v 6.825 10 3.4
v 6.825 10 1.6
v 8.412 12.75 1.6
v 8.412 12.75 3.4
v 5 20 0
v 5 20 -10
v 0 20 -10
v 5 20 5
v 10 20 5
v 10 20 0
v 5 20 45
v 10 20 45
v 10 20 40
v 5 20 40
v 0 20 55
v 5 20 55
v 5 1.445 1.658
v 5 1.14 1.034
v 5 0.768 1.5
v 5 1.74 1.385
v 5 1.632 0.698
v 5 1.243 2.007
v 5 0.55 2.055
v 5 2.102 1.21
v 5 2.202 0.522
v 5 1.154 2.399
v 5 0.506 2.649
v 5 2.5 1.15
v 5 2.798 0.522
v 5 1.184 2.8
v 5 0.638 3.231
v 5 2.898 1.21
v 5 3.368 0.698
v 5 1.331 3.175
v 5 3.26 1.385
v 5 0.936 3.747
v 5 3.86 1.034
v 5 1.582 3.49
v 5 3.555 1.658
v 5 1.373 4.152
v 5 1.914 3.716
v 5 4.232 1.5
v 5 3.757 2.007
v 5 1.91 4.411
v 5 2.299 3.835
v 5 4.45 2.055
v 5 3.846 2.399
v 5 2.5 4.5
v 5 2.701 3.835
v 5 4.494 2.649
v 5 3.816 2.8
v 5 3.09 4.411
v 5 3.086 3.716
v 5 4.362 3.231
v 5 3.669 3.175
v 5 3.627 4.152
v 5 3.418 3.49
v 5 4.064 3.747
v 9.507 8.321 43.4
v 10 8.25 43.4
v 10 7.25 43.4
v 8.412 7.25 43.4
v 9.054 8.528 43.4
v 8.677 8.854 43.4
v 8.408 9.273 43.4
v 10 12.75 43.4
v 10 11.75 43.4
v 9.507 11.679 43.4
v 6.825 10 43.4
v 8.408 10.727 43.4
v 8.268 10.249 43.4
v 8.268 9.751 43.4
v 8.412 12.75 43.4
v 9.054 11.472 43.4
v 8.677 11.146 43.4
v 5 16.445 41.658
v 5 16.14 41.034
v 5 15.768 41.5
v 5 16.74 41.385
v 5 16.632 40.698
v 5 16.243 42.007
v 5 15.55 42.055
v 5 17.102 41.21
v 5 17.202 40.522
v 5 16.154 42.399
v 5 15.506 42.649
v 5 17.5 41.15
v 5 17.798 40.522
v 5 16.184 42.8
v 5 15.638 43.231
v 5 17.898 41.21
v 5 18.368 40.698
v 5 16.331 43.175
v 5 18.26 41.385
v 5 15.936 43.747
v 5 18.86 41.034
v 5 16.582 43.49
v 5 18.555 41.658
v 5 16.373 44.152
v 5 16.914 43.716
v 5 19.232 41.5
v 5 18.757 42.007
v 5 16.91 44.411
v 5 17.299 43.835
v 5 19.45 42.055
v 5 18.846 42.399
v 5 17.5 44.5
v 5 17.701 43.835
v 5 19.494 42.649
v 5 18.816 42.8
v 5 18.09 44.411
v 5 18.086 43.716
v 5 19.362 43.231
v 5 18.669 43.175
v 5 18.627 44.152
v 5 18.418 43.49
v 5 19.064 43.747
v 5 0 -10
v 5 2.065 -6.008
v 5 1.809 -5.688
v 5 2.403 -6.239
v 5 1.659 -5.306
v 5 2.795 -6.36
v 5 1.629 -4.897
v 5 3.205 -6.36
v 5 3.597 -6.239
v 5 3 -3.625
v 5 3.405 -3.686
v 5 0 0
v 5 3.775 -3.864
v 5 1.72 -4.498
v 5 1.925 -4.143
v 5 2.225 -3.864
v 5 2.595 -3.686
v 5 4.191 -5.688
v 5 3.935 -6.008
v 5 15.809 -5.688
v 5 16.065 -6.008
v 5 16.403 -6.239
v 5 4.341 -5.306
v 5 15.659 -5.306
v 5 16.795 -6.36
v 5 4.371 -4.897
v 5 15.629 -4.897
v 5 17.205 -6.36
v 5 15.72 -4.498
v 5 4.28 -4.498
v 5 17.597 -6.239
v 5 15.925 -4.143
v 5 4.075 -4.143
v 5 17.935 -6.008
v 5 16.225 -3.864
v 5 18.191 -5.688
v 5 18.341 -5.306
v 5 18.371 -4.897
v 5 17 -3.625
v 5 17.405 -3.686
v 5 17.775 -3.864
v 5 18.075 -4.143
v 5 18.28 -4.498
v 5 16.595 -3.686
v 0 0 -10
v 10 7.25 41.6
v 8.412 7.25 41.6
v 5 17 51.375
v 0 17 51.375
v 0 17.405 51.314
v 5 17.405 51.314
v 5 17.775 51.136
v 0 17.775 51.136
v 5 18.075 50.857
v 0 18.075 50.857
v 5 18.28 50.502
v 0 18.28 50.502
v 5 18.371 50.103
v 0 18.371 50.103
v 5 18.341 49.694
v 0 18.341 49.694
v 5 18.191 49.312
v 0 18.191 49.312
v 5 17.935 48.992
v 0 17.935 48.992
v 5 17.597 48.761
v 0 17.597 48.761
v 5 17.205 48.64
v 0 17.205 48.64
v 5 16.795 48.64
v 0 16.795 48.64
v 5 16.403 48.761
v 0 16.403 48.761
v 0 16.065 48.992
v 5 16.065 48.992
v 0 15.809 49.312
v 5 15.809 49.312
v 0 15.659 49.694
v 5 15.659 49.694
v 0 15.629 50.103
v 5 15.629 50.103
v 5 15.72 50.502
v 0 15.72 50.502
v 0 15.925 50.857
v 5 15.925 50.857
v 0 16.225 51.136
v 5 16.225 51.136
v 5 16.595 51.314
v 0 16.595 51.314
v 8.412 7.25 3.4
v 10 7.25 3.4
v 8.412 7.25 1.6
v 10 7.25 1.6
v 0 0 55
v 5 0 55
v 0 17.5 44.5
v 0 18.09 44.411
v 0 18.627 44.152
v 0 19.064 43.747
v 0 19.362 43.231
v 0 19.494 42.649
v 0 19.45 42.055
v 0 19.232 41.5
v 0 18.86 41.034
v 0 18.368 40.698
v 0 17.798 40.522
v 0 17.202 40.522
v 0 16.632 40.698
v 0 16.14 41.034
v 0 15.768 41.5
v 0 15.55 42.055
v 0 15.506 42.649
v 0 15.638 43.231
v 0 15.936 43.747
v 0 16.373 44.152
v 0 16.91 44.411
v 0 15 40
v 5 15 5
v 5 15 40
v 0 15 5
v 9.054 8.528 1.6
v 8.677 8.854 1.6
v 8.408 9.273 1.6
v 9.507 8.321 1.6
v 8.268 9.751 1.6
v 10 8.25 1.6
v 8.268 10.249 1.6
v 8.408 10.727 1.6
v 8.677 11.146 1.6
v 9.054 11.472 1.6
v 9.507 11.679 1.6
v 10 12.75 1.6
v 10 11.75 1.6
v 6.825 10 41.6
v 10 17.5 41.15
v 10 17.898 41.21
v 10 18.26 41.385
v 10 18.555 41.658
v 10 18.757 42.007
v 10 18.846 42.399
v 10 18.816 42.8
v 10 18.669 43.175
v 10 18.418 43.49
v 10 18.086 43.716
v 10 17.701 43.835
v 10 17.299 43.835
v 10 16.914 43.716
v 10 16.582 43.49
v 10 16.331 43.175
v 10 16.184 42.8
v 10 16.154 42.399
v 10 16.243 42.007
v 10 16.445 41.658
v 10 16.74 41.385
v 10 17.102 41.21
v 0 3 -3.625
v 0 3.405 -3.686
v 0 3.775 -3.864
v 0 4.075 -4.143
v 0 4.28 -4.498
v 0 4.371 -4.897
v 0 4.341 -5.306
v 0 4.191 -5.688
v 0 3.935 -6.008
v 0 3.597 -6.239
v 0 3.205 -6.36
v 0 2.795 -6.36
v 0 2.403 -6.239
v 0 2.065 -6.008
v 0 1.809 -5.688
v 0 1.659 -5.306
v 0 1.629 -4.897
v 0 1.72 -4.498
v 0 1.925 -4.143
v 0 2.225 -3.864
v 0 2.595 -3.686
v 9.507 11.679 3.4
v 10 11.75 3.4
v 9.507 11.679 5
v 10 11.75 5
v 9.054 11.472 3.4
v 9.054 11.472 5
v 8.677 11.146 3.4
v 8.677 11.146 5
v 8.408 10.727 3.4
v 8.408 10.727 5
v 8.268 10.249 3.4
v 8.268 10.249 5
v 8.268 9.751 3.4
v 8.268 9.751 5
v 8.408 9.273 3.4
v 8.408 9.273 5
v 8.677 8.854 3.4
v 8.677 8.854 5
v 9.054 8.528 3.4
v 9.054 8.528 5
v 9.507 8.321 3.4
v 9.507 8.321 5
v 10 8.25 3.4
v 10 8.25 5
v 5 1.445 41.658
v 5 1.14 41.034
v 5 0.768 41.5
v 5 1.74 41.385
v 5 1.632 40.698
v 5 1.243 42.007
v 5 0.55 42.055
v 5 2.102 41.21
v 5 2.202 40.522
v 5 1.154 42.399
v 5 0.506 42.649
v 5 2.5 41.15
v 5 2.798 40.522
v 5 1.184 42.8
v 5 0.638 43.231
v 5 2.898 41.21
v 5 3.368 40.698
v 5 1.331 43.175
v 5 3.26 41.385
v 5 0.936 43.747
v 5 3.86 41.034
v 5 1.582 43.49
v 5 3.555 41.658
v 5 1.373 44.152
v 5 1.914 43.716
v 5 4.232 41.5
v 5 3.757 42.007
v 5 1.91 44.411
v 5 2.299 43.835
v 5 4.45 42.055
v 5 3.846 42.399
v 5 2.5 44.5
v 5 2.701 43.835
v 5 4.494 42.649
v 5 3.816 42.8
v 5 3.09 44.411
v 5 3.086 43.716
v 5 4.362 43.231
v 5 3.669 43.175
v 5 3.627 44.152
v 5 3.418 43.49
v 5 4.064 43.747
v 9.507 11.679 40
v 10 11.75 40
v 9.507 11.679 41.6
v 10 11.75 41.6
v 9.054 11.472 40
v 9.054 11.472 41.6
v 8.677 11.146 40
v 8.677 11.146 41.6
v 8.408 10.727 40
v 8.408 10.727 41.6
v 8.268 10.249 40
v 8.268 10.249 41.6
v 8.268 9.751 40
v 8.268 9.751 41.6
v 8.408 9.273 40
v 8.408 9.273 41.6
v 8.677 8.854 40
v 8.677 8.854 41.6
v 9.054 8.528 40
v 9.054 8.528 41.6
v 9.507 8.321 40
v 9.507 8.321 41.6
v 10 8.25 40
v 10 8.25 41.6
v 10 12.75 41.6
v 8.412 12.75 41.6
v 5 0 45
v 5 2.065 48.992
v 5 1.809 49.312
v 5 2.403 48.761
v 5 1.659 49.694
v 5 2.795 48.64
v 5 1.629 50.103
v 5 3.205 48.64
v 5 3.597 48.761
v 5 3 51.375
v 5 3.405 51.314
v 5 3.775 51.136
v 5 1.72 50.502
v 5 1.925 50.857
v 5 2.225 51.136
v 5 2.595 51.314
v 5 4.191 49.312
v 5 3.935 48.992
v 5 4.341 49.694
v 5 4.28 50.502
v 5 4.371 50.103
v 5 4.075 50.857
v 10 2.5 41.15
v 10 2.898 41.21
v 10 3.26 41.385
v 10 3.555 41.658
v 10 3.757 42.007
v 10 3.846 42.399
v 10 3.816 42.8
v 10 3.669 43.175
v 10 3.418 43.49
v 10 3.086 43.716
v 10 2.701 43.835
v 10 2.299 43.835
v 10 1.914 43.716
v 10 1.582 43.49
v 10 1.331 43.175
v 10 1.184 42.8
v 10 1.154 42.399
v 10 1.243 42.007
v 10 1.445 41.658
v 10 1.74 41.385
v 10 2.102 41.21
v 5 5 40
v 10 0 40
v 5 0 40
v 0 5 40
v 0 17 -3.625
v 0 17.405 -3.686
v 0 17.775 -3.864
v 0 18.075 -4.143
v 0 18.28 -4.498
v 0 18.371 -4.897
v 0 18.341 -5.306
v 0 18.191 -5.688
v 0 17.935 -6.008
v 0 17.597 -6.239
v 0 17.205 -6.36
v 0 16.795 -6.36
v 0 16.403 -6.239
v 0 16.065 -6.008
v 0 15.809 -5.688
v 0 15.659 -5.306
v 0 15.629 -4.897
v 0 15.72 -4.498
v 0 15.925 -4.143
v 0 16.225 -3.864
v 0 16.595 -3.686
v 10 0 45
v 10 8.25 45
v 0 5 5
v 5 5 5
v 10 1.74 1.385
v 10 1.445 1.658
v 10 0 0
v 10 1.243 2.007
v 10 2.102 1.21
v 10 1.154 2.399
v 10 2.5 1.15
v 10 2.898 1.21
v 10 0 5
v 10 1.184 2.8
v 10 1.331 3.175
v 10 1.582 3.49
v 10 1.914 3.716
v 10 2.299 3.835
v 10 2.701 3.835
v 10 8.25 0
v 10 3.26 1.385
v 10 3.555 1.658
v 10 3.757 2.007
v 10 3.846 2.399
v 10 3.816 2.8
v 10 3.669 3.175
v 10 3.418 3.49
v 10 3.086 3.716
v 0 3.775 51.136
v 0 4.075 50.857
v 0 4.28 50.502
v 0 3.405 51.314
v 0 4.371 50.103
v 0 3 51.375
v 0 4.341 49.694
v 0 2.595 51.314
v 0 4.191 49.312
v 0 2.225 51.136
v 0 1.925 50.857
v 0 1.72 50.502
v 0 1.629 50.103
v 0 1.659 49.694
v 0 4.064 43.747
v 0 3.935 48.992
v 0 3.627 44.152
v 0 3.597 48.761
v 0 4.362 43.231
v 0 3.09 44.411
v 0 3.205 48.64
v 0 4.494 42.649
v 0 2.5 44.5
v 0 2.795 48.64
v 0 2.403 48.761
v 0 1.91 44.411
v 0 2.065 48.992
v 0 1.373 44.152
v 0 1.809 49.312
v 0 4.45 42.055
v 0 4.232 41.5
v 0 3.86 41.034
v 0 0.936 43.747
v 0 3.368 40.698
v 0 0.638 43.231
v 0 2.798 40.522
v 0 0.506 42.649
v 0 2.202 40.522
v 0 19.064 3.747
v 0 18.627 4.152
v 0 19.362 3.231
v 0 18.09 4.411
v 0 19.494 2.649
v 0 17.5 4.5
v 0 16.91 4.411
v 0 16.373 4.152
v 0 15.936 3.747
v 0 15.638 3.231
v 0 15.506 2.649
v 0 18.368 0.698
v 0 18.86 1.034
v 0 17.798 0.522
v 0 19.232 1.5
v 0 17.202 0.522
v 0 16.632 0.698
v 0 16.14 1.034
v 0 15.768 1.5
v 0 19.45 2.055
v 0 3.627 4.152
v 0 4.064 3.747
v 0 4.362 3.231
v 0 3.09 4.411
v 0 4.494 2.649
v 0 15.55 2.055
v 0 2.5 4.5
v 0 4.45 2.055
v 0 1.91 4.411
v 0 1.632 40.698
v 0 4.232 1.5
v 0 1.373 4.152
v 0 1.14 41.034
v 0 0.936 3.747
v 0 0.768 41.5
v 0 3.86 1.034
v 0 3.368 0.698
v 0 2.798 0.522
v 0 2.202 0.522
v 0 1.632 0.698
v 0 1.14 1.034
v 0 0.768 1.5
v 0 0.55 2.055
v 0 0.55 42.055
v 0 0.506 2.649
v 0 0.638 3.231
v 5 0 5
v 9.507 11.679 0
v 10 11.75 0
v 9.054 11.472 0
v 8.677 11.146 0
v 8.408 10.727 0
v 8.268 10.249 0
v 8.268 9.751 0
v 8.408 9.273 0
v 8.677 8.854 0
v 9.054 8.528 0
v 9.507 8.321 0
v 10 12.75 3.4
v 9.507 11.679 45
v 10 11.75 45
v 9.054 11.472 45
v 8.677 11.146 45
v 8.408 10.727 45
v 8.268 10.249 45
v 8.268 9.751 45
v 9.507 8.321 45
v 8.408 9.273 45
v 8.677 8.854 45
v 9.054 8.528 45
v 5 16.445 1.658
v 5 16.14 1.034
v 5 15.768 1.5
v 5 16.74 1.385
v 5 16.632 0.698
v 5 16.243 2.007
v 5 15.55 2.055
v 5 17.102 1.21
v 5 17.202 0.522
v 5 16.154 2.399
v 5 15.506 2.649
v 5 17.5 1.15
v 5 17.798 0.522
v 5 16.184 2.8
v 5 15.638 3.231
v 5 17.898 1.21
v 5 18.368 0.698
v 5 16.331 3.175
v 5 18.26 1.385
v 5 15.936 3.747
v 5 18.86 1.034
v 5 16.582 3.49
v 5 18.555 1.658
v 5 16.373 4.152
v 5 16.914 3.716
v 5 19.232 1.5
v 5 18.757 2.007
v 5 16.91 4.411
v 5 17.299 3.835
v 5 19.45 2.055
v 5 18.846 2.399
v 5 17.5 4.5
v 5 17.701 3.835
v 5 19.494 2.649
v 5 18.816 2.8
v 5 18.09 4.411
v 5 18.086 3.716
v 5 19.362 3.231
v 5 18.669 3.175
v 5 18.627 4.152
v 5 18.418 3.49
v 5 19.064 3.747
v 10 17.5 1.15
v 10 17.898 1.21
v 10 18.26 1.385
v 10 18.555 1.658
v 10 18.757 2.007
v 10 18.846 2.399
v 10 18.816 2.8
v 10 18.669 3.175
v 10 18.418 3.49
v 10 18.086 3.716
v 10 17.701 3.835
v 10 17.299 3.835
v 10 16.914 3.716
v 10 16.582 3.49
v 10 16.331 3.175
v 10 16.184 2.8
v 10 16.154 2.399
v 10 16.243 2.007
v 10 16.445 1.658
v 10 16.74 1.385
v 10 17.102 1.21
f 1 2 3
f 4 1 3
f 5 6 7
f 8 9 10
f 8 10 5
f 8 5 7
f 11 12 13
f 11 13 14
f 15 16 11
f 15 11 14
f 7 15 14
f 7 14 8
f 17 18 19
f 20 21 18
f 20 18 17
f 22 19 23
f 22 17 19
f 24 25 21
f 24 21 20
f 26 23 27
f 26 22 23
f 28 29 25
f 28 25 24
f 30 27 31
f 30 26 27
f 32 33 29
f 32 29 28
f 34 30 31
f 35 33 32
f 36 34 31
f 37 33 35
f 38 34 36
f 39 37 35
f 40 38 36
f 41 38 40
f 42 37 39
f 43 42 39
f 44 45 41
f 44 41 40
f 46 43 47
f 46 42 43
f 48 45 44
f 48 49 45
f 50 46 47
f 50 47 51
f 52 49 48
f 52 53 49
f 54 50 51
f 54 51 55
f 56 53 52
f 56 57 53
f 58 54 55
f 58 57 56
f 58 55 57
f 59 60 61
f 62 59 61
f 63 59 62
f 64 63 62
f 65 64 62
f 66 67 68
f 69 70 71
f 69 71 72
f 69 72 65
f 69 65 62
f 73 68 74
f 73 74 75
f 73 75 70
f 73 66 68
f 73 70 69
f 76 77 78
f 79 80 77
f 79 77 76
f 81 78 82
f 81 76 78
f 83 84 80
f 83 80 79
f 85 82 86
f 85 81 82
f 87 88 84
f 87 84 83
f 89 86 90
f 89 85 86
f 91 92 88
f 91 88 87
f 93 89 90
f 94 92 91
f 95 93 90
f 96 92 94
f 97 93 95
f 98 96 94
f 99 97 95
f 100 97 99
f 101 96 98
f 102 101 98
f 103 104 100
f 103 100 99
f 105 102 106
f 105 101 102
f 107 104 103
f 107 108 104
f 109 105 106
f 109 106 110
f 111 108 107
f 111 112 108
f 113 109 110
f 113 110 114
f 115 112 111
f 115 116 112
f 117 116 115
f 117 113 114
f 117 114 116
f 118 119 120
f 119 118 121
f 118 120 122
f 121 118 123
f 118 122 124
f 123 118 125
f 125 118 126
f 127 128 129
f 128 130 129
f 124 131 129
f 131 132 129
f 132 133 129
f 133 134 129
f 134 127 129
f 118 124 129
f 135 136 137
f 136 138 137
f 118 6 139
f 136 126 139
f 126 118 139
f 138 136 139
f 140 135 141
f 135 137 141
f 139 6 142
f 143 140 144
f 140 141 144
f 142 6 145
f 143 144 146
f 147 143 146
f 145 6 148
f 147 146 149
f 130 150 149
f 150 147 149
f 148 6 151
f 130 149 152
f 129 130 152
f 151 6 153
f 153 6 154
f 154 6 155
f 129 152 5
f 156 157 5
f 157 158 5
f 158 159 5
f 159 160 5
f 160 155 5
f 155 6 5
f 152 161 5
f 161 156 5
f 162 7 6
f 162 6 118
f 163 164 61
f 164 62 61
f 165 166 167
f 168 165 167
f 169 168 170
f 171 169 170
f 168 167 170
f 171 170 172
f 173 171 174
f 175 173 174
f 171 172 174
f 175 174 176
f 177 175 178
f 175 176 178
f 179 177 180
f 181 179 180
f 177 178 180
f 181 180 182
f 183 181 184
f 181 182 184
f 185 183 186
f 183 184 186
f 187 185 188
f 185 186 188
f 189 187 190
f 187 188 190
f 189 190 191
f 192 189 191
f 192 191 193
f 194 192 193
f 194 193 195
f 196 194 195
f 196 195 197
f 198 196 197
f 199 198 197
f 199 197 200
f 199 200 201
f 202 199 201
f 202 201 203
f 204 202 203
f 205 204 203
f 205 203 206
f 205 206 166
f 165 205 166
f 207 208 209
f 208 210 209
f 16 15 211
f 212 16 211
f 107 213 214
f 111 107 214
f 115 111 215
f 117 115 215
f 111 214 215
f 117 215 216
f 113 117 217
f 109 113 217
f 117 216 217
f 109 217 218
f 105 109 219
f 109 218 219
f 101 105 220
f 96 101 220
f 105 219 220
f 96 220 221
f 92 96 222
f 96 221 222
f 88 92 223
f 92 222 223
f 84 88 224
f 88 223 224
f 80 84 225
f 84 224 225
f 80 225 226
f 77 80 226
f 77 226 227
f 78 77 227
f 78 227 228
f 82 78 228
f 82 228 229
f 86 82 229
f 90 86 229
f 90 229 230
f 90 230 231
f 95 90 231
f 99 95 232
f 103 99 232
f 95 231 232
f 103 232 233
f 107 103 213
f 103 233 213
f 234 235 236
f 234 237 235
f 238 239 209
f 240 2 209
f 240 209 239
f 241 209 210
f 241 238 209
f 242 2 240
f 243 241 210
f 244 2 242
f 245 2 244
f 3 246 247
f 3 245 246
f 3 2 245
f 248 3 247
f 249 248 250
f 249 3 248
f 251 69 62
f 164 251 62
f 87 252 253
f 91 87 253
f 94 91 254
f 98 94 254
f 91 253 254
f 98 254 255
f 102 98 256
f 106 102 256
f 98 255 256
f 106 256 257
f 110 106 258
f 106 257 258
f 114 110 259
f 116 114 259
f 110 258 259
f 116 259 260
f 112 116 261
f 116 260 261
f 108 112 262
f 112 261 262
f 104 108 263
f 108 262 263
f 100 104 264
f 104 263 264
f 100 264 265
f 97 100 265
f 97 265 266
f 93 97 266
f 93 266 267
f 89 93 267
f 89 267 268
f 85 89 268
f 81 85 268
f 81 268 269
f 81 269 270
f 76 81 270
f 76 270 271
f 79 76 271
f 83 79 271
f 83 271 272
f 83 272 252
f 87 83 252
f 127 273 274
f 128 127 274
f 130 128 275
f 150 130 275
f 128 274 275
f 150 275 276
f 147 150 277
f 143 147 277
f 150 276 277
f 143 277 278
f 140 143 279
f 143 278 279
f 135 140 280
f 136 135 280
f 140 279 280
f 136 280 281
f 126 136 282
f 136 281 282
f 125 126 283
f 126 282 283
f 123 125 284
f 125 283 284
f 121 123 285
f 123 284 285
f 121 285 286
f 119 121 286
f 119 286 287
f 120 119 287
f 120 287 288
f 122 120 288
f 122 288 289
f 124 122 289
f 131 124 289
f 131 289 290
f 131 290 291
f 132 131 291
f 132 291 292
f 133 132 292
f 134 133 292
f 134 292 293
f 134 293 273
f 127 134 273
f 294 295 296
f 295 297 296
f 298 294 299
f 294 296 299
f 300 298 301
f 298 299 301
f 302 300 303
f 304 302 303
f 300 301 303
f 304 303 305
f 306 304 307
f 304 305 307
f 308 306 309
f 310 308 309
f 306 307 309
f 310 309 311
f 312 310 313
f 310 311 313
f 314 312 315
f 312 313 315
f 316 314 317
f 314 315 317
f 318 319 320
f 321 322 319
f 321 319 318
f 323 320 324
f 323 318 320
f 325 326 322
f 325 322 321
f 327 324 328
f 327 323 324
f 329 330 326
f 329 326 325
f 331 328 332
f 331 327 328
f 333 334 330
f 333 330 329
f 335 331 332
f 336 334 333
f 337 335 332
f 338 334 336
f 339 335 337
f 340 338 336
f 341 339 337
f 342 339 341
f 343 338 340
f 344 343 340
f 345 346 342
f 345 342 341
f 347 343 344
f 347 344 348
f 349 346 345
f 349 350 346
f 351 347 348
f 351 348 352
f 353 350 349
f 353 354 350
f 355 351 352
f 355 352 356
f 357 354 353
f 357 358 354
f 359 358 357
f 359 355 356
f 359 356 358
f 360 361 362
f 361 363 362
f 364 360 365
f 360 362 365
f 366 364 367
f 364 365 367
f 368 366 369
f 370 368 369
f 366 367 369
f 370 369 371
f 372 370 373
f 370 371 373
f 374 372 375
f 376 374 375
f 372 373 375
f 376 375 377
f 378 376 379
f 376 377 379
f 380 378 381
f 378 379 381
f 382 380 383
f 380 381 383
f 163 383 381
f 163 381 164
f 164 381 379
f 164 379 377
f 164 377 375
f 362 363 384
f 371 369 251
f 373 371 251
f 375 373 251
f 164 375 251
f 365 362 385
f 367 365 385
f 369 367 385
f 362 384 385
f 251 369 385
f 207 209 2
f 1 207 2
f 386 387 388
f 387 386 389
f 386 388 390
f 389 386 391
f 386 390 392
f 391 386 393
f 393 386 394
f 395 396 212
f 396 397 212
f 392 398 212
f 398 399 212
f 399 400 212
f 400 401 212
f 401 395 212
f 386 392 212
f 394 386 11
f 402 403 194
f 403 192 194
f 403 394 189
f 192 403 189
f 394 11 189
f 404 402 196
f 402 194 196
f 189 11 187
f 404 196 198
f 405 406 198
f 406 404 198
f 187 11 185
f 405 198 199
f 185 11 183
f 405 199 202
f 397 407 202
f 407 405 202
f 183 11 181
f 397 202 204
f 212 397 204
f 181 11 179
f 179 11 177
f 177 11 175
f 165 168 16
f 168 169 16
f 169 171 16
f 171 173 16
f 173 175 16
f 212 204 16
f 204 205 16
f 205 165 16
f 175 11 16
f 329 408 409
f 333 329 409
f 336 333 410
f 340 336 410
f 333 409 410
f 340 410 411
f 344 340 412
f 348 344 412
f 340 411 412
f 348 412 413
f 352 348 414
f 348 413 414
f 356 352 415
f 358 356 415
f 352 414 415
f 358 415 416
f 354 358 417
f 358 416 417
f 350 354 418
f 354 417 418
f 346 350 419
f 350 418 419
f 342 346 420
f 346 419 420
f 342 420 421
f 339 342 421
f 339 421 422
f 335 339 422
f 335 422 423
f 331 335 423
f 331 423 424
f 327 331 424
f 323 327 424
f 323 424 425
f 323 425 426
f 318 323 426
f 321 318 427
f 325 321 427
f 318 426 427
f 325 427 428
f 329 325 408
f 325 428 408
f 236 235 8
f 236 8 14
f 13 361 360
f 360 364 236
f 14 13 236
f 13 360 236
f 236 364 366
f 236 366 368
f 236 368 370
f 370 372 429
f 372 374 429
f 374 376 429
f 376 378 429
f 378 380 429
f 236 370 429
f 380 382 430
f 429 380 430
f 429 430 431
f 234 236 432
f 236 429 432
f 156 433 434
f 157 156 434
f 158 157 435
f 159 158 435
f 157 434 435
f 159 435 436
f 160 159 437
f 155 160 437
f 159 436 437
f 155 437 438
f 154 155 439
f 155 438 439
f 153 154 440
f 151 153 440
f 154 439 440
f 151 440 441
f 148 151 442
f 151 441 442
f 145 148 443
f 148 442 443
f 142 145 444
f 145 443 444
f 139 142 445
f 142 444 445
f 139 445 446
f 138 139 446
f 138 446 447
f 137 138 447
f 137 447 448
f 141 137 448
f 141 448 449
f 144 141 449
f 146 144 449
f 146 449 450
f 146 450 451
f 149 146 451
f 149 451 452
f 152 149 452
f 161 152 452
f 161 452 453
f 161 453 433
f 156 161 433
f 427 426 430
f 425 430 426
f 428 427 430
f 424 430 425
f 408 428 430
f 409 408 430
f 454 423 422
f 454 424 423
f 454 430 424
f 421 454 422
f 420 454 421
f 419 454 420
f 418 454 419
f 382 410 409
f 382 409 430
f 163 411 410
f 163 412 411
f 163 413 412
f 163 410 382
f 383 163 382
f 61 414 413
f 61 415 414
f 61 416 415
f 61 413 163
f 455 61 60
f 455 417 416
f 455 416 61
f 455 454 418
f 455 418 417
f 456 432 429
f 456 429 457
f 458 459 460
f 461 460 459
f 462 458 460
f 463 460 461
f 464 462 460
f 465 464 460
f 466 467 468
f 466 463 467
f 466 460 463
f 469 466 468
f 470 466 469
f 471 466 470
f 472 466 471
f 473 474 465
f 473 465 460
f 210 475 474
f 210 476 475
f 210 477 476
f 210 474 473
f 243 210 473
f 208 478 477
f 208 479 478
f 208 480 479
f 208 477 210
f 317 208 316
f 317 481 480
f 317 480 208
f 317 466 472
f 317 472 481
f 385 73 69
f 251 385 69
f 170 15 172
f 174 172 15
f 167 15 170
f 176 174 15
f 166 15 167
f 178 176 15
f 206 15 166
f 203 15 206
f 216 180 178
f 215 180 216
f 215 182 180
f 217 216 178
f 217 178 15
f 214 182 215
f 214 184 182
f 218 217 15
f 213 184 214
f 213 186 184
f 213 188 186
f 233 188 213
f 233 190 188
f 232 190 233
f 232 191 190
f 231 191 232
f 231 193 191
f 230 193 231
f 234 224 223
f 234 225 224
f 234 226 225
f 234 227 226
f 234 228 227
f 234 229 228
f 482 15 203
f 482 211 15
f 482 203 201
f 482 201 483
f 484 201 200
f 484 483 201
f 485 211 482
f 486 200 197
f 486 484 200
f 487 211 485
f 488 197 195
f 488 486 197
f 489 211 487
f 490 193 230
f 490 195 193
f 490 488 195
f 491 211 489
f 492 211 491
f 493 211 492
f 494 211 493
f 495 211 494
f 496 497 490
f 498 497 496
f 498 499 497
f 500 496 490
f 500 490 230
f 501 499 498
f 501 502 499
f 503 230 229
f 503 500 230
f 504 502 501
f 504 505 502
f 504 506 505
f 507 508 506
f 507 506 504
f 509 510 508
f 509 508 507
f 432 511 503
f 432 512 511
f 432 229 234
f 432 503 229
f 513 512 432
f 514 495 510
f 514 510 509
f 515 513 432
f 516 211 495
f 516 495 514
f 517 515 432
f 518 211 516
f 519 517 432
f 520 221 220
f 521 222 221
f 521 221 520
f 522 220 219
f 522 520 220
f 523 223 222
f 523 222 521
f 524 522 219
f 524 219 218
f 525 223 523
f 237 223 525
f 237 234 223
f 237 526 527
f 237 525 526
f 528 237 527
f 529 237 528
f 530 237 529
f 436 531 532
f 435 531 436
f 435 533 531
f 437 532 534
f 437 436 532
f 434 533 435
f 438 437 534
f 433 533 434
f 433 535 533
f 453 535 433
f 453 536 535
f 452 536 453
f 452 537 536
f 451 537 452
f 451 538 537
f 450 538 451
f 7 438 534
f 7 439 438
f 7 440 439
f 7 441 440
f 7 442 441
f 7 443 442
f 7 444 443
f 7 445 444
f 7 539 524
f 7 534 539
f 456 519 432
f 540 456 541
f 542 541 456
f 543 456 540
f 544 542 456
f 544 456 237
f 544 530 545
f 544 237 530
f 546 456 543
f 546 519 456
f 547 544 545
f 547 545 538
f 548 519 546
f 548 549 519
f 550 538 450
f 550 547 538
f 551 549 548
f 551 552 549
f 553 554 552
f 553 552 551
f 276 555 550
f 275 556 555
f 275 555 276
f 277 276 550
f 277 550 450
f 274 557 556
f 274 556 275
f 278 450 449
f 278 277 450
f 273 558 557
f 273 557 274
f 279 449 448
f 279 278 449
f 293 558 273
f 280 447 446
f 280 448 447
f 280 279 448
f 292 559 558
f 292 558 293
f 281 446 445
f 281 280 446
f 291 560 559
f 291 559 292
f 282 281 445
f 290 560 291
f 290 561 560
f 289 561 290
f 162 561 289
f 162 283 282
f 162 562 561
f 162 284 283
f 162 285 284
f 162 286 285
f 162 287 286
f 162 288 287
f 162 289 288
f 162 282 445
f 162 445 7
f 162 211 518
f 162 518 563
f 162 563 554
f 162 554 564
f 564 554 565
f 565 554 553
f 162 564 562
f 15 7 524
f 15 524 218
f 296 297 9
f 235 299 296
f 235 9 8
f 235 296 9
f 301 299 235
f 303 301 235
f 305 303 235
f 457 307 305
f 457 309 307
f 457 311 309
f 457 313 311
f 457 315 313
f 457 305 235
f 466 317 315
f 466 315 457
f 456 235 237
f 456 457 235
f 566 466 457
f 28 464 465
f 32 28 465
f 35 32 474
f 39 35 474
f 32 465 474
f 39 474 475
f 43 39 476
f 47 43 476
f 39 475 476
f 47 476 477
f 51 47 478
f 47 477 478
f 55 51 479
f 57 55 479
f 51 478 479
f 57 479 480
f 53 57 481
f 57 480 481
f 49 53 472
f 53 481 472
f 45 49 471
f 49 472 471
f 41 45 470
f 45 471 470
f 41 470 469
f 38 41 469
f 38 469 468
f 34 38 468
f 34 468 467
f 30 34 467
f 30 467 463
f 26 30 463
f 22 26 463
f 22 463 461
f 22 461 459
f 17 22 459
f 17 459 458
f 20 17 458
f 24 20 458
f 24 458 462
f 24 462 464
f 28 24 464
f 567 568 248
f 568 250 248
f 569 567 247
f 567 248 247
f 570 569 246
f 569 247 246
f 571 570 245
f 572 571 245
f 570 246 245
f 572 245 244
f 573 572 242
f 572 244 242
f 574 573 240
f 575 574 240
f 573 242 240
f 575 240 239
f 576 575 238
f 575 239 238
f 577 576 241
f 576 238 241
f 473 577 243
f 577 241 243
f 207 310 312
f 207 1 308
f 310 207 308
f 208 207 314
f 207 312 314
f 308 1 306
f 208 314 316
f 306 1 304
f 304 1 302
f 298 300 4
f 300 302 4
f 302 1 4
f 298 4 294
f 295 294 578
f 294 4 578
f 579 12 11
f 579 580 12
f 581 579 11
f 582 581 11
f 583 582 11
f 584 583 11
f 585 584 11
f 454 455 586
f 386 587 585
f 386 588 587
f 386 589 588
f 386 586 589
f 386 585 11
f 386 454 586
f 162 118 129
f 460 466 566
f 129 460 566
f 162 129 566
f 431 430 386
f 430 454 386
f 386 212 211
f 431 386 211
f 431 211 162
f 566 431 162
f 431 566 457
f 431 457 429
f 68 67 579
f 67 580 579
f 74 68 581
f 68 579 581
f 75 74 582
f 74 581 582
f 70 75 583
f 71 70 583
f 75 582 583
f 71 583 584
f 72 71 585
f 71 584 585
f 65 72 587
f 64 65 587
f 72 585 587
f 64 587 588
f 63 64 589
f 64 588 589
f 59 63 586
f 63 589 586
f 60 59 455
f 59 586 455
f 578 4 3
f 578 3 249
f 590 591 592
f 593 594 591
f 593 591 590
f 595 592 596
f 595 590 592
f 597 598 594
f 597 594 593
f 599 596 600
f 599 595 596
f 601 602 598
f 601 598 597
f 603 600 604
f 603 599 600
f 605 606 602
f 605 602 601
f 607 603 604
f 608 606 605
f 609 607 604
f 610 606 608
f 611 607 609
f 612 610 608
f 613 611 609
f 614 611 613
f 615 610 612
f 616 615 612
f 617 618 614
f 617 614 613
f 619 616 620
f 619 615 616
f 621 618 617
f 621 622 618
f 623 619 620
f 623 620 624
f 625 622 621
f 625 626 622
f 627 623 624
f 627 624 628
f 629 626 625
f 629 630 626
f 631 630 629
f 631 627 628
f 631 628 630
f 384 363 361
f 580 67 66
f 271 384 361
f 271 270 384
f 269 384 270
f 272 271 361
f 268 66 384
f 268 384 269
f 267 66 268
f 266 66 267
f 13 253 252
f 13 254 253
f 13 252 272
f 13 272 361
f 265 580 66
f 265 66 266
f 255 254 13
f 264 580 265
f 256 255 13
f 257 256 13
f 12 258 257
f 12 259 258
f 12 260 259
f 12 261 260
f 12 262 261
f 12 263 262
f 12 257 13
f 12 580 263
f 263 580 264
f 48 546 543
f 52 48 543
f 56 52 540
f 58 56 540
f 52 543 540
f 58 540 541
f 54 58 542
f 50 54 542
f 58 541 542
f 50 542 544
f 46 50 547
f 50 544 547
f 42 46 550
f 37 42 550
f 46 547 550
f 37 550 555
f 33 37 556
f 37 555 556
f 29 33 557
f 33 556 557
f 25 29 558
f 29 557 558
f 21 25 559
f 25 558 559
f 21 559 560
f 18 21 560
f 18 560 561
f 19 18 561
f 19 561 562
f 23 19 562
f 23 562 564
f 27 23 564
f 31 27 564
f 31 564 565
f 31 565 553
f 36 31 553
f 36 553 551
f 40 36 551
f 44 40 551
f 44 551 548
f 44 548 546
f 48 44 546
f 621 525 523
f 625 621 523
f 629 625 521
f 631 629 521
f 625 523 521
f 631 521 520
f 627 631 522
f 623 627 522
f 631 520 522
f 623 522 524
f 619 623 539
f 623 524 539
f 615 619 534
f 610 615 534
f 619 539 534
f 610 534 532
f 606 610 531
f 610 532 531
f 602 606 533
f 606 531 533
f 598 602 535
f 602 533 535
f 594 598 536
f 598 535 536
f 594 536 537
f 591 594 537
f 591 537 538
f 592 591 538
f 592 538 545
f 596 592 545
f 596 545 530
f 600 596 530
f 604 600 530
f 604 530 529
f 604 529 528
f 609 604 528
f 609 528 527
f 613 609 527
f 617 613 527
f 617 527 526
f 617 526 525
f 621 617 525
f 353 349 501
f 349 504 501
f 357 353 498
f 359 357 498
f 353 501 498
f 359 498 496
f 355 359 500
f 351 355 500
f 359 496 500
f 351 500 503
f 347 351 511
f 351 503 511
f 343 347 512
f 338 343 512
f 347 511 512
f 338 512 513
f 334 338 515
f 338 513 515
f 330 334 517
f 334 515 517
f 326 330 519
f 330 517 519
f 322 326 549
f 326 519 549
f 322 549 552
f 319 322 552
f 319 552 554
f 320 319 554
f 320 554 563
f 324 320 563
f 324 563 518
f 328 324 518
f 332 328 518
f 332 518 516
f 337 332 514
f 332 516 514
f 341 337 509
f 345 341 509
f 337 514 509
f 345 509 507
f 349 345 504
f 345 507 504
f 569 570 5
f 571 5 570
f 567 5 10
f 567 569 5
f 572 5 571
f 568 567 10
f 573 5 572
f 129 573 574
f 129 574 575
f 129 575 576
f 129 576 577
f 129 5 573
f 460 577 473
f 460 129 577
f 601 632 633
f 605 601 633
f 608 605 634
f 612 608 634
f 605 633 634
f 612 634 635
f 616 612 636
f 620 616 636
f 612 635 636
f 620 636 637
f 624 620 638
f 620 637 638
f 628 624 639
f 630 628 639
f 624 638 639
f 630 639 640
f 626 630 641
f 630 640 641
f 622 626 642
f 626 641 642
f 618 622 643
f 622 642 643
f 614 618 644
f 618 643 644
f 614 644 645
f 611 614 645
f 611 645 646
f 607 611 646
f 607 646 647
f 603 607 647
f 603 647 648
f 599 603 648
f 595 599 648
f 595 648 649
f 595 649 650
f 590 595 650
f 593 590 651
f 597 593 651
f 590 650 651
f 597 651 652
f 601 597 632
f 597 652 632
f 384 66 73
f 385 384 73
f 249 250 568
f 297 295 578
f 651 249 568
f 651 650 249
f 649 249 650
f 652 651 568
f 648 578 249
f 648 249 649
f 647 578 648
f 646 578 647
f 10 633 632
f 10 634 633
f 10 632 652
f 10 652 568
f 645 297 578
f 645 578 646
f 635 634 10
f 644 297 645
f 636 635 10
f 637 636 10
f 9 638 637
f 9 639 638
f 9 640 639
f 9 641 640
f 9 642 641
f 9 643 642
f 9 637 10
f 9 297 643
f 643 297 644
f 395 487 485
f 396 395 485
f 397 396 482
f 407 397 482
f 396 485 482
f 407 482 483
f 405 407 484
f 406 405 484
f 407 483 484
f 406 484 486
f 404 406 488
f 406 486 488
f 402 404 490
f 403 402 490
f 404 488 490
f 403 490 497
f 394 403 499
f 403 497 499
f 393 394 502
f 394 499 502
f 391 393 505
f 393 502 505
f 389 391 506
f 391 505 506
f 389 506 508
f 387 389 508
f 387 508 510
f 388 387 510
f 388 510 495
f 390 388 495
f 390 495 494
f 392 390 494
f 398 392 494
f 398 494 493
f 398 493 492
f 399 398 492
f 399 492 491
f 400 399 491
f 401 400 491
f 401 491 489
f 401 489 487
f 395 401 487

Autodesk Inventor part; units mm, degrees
ref_plane "YZ Plane" through (0, 0, 0) normal (1, 0, 0) x (0, 1, 0)
sketch "Sketch1" plane through (0, 0, 0) normal (0, 1, 0) x (-1, 0, 0)
  line L0 (0, 0) -> (-5, 0)
  line L1 (-5, 0) -> (-5, 45)
  line L2 (-5, 45) -> (0, 45)
  line L3 (0, 45) -> (0, 0)
  line L4 (-5, 45) -> (-20, 45)
  line L5 (-20, 45) -> (-20, 40)
  line L6 (-20, 40) -> (-5, 40)
  line L7 (-5, 40) -> (-5, 45)
  line L8 (-5, 0) -> (-20, 0)
  line L9 (-20, 0) -> (-20, 5)
  line L10 (-20, 5) -> (-5, 5)
  line L11 (-5, 5) -> (-5, 0)
  point P0 (-5, 40)
  point P1 (-5, 5)
  dimension "d0" = 5
  dimension "d1" = 5
  dimension "d2" = 5
  dimension "d3" = 15
  dimension "d4" = 15
  dimension "d5" = 35
extrude "Extrusion1" add sketch "Sketch1" along normal blind 20
sketch "Sketch2" plane through (0, 0, 45) normal (0, 0, 1) x (1, 0, 0)
  circle A0 centre (10, 10) radius 1.75
  line L0 (20, 0) -> (20, 20) projected
  line L1 (20, 0) -> (10, 0)
  line L2 (10, 0) -> (10, 20)
  line L3 (10, 20) -> (20, 20)
  line L4 (20, 20) -> (20, 0)
  line L5 (0, 0) -> (20, 0) projected
  dimension "d8" = 10
  dimension "d9" = 10
  dimension "d10" = 10
  dimension "d11" = 3.5
extrude "Extrusion2" cut sketch "Sketch2" against normal blind 200
sketch "Sketch3" plane through (0, 0, 0) normal (-1, 0, 0) x (0, 0, 1)
  line L0 (5, 0) -> (5, 20) projected
  line L1 (40, 0) -> (40, 20) projected
  line L2 (5, 15) -> (40, 15)
  line L3 (40, 15) -> (40, 5)
  line L4 (40, 5) -> (5, 5)
  line L5 (5, 5) -> (5, 15)
  line L6 (0, 20) -> (45, 20) projected
  line L7 (0, 0) -> (45, 0) projected
  point P0 (5, 5)
  dimension "d14" = 5
  dimension "d15" = 5
extrude "Extrusion3" cut sketch "Sketch3" against normal blind 20 contours L0 L2 L1 L4
sketch "Sketch4" plane through (0, 0, 0) normal (-1, 0, 0) x (0, 0, 1)
  line L0 (45, 0) -> (45, 20) projected
  line L1 (45, 20) -> (55, 20)
  line L2 (55, 20) -> (55, 0)
  line L3 (55, 0) -> (45, 0)
  line L4 (45, 0) -> (45, 20)
  line L5 (0, 20) -> (0, 11.75) projected
  line L6 (0, 20) -> (-10, 20)
  line L7 (-10, 20) -> (-10, 0)
  line L8 (-10, 0) -> (0, 0)
  line L9 (0, 0) -> (0, 20)
  circle A0 centre (50, 3) radius 1.375
  circle A1 centre (50, 17) radius 1.375
  circle A2 centre (-5, 17) radius 1.375
  circle A3 centre (-5, 3) radius 1.375
  point P0 (0, 0)
  point P1 (50, 20)
  dimension "d18" = 10
  dimension "d19" = 10
  dimension "d20" = 3
  dimension "d21" = 3
  dimension "d22" = 5
  dimension "d23" = 5
  dimension "d24" = 5
  dimension "d25" = 5
  dimension "d26" = 3
  dimension "d27" = 3
  dimension "d28" = 2.75
  dimension "d29" = 2.75
  dimension "d30" = 2.75
  dimension "d31" = 2.75
extrude "Extrusion4" add sketch "Sketch4" against normal blind 5
sketch "Sketch5" plane through (10, 11.75, 45) normal (1, 0, 0) x (0, 0, -1)
  circle A0 centre (42.5, 5.75) radius 1.35
  circle A1 centre (42.5, -9.25) radius 1.35
  circle A2 centre (2.5, 5.75) radius 1.35
  circle A3 centre (2.5, -9.25) radius 1.35
  line L0 (40, 8.25) -> (45, 8.25) projected
  line L1 (45, 8.25) -> (45, 0) projected
  line L2 (45, -3.5) -> (45, -11.75) projected
  line L3 (45, -11.75) -> (40, -11.75) projected
  line L4 (5, -11.75) -> (0, -11.75) projected
  line L5 (0, -11.75) -> (0, -3.5) projected
  line L6 (0, 0) -> (0, 8.25) projected
  line L7 (0, 8.25) -> (5, 8.25) projected
  dimension "d34" = 2.5
  dimension "d35" = 2.5
  dimension "d36" = 2.5
  dimension "d37" = 2.5
  dimension "d38" = 2.5
  dimension "d39" = 2.5
  dimension "d40" = 2.5
  dimension "d41" = 2.5
  dimension "d42" = 2.7
  dimension "d43" = 2.7
  dimension "d44" = 2.7
  dimension "d45" = 2.7
extrude "Extrusion5" cut sketch "Sketch5" against normal blind 15
sketch "Sketch6" plane through (0, 0, 55) normal (-1, 0, 0) x (0, 0, 1)
  circle A0 centre (-12.5, 17.5) radius 1.35 projected
  circle A1 centre (-12.5, 17.5) radius 2
  circle A2 centre (-12.5, 2.5) radius 1.35 projected
  circle A3 centre (-12.5, 2.5) radius 2
  circle A4 centre (-52.5, 2.5) radius 1.35 projected
  circle A5 centre (-52.5, 2.5) radius 2
  circle A6 centre (-52.5, 17.5) radius 1.35 projected
  circle A7 centre (-52.5, 17.5) radius 2
  point P0 (-55, 0)
  dimension "d48" = 4
  dimension "d49" = 4
  dimension "d50" = 4
  dimension "d51" = 4
extrude "Extrusion6" cut sketch "Sketch6" against normal blind 5 contours A0 | A1 | A2 | A3 | A4 | A5 | A6 | A7
ref_plane "Work Plane1" through (10, 0, 42.5) normal (0, 0, -1) x (-1, 0, 0)
sketch "Sketch7" plane through (10, 0, 42.5) normal (0, 0, -1) x (-1, 0, 0)
  line L0 (-3.1754, 10) -> (-1.5877, 12.75)
  line L1 (-1.5877, 12.75) -> (1.5877, 12.75)
  line L2 (1.5877, 12.75) -> (3.1754, 10)
  line L3 (3.1754, 10) -> (1.5877, 7.25)
  line L4 (1.5877, 7.25) -> (-1.5877, 7.25)
  line L5 (-1.5877, 7.25) -> (-3.1754, 10)
  line L6 (0, 11.75) -> (0, 20) projected
  line L7 (5, 20) -> (0, 20) projected
  line L8 (5, 0) -> (0, 0) projected
  point P0 (10, 0)
  point P1 (0, 10)
  dimension "d54" = 2.75
  dimension "d55" = 0
  dimension "d56" = 10
  dimension "d57" = 20
extrude "Extrusion7" cut sketch "Sketch7" along normal mid plane 1.8
ref_plane "Work Plane2" through (0, 0, 22.5) normal (0, 0, 1) x (1, 0, 0)
mirror "Mirror1" about plane through (0, 0, 22.5) normal (0, 0, 1) of "Extrusion7"
equation "\"d14\" = d15"
equation "\"d19\" = d18"
equation "\"d20\" = d21"
equation "\"d24\" = d23"
equation "\"d25\" = d22"
equation "\"d26\" = d20"
equation "\"d27\" = d21"
equation "\"d34\" = d35"
equation "\"d37\" = d34"
equation "\"d38\" = d34"
equation "\"d39\" = d36"
equation "\"d40\" = d39"
equation "\"d41\" = d34"
equation "\"d43\" = d42"
equation "\"d44\" = d42"
equation "\"d45\" = d43"
equation "\"d49\" = d48"
equation "\"d50\" = d49"
equation "\"d51\" = d48"
properties part number "MotorDifferentialMountingBracket"
